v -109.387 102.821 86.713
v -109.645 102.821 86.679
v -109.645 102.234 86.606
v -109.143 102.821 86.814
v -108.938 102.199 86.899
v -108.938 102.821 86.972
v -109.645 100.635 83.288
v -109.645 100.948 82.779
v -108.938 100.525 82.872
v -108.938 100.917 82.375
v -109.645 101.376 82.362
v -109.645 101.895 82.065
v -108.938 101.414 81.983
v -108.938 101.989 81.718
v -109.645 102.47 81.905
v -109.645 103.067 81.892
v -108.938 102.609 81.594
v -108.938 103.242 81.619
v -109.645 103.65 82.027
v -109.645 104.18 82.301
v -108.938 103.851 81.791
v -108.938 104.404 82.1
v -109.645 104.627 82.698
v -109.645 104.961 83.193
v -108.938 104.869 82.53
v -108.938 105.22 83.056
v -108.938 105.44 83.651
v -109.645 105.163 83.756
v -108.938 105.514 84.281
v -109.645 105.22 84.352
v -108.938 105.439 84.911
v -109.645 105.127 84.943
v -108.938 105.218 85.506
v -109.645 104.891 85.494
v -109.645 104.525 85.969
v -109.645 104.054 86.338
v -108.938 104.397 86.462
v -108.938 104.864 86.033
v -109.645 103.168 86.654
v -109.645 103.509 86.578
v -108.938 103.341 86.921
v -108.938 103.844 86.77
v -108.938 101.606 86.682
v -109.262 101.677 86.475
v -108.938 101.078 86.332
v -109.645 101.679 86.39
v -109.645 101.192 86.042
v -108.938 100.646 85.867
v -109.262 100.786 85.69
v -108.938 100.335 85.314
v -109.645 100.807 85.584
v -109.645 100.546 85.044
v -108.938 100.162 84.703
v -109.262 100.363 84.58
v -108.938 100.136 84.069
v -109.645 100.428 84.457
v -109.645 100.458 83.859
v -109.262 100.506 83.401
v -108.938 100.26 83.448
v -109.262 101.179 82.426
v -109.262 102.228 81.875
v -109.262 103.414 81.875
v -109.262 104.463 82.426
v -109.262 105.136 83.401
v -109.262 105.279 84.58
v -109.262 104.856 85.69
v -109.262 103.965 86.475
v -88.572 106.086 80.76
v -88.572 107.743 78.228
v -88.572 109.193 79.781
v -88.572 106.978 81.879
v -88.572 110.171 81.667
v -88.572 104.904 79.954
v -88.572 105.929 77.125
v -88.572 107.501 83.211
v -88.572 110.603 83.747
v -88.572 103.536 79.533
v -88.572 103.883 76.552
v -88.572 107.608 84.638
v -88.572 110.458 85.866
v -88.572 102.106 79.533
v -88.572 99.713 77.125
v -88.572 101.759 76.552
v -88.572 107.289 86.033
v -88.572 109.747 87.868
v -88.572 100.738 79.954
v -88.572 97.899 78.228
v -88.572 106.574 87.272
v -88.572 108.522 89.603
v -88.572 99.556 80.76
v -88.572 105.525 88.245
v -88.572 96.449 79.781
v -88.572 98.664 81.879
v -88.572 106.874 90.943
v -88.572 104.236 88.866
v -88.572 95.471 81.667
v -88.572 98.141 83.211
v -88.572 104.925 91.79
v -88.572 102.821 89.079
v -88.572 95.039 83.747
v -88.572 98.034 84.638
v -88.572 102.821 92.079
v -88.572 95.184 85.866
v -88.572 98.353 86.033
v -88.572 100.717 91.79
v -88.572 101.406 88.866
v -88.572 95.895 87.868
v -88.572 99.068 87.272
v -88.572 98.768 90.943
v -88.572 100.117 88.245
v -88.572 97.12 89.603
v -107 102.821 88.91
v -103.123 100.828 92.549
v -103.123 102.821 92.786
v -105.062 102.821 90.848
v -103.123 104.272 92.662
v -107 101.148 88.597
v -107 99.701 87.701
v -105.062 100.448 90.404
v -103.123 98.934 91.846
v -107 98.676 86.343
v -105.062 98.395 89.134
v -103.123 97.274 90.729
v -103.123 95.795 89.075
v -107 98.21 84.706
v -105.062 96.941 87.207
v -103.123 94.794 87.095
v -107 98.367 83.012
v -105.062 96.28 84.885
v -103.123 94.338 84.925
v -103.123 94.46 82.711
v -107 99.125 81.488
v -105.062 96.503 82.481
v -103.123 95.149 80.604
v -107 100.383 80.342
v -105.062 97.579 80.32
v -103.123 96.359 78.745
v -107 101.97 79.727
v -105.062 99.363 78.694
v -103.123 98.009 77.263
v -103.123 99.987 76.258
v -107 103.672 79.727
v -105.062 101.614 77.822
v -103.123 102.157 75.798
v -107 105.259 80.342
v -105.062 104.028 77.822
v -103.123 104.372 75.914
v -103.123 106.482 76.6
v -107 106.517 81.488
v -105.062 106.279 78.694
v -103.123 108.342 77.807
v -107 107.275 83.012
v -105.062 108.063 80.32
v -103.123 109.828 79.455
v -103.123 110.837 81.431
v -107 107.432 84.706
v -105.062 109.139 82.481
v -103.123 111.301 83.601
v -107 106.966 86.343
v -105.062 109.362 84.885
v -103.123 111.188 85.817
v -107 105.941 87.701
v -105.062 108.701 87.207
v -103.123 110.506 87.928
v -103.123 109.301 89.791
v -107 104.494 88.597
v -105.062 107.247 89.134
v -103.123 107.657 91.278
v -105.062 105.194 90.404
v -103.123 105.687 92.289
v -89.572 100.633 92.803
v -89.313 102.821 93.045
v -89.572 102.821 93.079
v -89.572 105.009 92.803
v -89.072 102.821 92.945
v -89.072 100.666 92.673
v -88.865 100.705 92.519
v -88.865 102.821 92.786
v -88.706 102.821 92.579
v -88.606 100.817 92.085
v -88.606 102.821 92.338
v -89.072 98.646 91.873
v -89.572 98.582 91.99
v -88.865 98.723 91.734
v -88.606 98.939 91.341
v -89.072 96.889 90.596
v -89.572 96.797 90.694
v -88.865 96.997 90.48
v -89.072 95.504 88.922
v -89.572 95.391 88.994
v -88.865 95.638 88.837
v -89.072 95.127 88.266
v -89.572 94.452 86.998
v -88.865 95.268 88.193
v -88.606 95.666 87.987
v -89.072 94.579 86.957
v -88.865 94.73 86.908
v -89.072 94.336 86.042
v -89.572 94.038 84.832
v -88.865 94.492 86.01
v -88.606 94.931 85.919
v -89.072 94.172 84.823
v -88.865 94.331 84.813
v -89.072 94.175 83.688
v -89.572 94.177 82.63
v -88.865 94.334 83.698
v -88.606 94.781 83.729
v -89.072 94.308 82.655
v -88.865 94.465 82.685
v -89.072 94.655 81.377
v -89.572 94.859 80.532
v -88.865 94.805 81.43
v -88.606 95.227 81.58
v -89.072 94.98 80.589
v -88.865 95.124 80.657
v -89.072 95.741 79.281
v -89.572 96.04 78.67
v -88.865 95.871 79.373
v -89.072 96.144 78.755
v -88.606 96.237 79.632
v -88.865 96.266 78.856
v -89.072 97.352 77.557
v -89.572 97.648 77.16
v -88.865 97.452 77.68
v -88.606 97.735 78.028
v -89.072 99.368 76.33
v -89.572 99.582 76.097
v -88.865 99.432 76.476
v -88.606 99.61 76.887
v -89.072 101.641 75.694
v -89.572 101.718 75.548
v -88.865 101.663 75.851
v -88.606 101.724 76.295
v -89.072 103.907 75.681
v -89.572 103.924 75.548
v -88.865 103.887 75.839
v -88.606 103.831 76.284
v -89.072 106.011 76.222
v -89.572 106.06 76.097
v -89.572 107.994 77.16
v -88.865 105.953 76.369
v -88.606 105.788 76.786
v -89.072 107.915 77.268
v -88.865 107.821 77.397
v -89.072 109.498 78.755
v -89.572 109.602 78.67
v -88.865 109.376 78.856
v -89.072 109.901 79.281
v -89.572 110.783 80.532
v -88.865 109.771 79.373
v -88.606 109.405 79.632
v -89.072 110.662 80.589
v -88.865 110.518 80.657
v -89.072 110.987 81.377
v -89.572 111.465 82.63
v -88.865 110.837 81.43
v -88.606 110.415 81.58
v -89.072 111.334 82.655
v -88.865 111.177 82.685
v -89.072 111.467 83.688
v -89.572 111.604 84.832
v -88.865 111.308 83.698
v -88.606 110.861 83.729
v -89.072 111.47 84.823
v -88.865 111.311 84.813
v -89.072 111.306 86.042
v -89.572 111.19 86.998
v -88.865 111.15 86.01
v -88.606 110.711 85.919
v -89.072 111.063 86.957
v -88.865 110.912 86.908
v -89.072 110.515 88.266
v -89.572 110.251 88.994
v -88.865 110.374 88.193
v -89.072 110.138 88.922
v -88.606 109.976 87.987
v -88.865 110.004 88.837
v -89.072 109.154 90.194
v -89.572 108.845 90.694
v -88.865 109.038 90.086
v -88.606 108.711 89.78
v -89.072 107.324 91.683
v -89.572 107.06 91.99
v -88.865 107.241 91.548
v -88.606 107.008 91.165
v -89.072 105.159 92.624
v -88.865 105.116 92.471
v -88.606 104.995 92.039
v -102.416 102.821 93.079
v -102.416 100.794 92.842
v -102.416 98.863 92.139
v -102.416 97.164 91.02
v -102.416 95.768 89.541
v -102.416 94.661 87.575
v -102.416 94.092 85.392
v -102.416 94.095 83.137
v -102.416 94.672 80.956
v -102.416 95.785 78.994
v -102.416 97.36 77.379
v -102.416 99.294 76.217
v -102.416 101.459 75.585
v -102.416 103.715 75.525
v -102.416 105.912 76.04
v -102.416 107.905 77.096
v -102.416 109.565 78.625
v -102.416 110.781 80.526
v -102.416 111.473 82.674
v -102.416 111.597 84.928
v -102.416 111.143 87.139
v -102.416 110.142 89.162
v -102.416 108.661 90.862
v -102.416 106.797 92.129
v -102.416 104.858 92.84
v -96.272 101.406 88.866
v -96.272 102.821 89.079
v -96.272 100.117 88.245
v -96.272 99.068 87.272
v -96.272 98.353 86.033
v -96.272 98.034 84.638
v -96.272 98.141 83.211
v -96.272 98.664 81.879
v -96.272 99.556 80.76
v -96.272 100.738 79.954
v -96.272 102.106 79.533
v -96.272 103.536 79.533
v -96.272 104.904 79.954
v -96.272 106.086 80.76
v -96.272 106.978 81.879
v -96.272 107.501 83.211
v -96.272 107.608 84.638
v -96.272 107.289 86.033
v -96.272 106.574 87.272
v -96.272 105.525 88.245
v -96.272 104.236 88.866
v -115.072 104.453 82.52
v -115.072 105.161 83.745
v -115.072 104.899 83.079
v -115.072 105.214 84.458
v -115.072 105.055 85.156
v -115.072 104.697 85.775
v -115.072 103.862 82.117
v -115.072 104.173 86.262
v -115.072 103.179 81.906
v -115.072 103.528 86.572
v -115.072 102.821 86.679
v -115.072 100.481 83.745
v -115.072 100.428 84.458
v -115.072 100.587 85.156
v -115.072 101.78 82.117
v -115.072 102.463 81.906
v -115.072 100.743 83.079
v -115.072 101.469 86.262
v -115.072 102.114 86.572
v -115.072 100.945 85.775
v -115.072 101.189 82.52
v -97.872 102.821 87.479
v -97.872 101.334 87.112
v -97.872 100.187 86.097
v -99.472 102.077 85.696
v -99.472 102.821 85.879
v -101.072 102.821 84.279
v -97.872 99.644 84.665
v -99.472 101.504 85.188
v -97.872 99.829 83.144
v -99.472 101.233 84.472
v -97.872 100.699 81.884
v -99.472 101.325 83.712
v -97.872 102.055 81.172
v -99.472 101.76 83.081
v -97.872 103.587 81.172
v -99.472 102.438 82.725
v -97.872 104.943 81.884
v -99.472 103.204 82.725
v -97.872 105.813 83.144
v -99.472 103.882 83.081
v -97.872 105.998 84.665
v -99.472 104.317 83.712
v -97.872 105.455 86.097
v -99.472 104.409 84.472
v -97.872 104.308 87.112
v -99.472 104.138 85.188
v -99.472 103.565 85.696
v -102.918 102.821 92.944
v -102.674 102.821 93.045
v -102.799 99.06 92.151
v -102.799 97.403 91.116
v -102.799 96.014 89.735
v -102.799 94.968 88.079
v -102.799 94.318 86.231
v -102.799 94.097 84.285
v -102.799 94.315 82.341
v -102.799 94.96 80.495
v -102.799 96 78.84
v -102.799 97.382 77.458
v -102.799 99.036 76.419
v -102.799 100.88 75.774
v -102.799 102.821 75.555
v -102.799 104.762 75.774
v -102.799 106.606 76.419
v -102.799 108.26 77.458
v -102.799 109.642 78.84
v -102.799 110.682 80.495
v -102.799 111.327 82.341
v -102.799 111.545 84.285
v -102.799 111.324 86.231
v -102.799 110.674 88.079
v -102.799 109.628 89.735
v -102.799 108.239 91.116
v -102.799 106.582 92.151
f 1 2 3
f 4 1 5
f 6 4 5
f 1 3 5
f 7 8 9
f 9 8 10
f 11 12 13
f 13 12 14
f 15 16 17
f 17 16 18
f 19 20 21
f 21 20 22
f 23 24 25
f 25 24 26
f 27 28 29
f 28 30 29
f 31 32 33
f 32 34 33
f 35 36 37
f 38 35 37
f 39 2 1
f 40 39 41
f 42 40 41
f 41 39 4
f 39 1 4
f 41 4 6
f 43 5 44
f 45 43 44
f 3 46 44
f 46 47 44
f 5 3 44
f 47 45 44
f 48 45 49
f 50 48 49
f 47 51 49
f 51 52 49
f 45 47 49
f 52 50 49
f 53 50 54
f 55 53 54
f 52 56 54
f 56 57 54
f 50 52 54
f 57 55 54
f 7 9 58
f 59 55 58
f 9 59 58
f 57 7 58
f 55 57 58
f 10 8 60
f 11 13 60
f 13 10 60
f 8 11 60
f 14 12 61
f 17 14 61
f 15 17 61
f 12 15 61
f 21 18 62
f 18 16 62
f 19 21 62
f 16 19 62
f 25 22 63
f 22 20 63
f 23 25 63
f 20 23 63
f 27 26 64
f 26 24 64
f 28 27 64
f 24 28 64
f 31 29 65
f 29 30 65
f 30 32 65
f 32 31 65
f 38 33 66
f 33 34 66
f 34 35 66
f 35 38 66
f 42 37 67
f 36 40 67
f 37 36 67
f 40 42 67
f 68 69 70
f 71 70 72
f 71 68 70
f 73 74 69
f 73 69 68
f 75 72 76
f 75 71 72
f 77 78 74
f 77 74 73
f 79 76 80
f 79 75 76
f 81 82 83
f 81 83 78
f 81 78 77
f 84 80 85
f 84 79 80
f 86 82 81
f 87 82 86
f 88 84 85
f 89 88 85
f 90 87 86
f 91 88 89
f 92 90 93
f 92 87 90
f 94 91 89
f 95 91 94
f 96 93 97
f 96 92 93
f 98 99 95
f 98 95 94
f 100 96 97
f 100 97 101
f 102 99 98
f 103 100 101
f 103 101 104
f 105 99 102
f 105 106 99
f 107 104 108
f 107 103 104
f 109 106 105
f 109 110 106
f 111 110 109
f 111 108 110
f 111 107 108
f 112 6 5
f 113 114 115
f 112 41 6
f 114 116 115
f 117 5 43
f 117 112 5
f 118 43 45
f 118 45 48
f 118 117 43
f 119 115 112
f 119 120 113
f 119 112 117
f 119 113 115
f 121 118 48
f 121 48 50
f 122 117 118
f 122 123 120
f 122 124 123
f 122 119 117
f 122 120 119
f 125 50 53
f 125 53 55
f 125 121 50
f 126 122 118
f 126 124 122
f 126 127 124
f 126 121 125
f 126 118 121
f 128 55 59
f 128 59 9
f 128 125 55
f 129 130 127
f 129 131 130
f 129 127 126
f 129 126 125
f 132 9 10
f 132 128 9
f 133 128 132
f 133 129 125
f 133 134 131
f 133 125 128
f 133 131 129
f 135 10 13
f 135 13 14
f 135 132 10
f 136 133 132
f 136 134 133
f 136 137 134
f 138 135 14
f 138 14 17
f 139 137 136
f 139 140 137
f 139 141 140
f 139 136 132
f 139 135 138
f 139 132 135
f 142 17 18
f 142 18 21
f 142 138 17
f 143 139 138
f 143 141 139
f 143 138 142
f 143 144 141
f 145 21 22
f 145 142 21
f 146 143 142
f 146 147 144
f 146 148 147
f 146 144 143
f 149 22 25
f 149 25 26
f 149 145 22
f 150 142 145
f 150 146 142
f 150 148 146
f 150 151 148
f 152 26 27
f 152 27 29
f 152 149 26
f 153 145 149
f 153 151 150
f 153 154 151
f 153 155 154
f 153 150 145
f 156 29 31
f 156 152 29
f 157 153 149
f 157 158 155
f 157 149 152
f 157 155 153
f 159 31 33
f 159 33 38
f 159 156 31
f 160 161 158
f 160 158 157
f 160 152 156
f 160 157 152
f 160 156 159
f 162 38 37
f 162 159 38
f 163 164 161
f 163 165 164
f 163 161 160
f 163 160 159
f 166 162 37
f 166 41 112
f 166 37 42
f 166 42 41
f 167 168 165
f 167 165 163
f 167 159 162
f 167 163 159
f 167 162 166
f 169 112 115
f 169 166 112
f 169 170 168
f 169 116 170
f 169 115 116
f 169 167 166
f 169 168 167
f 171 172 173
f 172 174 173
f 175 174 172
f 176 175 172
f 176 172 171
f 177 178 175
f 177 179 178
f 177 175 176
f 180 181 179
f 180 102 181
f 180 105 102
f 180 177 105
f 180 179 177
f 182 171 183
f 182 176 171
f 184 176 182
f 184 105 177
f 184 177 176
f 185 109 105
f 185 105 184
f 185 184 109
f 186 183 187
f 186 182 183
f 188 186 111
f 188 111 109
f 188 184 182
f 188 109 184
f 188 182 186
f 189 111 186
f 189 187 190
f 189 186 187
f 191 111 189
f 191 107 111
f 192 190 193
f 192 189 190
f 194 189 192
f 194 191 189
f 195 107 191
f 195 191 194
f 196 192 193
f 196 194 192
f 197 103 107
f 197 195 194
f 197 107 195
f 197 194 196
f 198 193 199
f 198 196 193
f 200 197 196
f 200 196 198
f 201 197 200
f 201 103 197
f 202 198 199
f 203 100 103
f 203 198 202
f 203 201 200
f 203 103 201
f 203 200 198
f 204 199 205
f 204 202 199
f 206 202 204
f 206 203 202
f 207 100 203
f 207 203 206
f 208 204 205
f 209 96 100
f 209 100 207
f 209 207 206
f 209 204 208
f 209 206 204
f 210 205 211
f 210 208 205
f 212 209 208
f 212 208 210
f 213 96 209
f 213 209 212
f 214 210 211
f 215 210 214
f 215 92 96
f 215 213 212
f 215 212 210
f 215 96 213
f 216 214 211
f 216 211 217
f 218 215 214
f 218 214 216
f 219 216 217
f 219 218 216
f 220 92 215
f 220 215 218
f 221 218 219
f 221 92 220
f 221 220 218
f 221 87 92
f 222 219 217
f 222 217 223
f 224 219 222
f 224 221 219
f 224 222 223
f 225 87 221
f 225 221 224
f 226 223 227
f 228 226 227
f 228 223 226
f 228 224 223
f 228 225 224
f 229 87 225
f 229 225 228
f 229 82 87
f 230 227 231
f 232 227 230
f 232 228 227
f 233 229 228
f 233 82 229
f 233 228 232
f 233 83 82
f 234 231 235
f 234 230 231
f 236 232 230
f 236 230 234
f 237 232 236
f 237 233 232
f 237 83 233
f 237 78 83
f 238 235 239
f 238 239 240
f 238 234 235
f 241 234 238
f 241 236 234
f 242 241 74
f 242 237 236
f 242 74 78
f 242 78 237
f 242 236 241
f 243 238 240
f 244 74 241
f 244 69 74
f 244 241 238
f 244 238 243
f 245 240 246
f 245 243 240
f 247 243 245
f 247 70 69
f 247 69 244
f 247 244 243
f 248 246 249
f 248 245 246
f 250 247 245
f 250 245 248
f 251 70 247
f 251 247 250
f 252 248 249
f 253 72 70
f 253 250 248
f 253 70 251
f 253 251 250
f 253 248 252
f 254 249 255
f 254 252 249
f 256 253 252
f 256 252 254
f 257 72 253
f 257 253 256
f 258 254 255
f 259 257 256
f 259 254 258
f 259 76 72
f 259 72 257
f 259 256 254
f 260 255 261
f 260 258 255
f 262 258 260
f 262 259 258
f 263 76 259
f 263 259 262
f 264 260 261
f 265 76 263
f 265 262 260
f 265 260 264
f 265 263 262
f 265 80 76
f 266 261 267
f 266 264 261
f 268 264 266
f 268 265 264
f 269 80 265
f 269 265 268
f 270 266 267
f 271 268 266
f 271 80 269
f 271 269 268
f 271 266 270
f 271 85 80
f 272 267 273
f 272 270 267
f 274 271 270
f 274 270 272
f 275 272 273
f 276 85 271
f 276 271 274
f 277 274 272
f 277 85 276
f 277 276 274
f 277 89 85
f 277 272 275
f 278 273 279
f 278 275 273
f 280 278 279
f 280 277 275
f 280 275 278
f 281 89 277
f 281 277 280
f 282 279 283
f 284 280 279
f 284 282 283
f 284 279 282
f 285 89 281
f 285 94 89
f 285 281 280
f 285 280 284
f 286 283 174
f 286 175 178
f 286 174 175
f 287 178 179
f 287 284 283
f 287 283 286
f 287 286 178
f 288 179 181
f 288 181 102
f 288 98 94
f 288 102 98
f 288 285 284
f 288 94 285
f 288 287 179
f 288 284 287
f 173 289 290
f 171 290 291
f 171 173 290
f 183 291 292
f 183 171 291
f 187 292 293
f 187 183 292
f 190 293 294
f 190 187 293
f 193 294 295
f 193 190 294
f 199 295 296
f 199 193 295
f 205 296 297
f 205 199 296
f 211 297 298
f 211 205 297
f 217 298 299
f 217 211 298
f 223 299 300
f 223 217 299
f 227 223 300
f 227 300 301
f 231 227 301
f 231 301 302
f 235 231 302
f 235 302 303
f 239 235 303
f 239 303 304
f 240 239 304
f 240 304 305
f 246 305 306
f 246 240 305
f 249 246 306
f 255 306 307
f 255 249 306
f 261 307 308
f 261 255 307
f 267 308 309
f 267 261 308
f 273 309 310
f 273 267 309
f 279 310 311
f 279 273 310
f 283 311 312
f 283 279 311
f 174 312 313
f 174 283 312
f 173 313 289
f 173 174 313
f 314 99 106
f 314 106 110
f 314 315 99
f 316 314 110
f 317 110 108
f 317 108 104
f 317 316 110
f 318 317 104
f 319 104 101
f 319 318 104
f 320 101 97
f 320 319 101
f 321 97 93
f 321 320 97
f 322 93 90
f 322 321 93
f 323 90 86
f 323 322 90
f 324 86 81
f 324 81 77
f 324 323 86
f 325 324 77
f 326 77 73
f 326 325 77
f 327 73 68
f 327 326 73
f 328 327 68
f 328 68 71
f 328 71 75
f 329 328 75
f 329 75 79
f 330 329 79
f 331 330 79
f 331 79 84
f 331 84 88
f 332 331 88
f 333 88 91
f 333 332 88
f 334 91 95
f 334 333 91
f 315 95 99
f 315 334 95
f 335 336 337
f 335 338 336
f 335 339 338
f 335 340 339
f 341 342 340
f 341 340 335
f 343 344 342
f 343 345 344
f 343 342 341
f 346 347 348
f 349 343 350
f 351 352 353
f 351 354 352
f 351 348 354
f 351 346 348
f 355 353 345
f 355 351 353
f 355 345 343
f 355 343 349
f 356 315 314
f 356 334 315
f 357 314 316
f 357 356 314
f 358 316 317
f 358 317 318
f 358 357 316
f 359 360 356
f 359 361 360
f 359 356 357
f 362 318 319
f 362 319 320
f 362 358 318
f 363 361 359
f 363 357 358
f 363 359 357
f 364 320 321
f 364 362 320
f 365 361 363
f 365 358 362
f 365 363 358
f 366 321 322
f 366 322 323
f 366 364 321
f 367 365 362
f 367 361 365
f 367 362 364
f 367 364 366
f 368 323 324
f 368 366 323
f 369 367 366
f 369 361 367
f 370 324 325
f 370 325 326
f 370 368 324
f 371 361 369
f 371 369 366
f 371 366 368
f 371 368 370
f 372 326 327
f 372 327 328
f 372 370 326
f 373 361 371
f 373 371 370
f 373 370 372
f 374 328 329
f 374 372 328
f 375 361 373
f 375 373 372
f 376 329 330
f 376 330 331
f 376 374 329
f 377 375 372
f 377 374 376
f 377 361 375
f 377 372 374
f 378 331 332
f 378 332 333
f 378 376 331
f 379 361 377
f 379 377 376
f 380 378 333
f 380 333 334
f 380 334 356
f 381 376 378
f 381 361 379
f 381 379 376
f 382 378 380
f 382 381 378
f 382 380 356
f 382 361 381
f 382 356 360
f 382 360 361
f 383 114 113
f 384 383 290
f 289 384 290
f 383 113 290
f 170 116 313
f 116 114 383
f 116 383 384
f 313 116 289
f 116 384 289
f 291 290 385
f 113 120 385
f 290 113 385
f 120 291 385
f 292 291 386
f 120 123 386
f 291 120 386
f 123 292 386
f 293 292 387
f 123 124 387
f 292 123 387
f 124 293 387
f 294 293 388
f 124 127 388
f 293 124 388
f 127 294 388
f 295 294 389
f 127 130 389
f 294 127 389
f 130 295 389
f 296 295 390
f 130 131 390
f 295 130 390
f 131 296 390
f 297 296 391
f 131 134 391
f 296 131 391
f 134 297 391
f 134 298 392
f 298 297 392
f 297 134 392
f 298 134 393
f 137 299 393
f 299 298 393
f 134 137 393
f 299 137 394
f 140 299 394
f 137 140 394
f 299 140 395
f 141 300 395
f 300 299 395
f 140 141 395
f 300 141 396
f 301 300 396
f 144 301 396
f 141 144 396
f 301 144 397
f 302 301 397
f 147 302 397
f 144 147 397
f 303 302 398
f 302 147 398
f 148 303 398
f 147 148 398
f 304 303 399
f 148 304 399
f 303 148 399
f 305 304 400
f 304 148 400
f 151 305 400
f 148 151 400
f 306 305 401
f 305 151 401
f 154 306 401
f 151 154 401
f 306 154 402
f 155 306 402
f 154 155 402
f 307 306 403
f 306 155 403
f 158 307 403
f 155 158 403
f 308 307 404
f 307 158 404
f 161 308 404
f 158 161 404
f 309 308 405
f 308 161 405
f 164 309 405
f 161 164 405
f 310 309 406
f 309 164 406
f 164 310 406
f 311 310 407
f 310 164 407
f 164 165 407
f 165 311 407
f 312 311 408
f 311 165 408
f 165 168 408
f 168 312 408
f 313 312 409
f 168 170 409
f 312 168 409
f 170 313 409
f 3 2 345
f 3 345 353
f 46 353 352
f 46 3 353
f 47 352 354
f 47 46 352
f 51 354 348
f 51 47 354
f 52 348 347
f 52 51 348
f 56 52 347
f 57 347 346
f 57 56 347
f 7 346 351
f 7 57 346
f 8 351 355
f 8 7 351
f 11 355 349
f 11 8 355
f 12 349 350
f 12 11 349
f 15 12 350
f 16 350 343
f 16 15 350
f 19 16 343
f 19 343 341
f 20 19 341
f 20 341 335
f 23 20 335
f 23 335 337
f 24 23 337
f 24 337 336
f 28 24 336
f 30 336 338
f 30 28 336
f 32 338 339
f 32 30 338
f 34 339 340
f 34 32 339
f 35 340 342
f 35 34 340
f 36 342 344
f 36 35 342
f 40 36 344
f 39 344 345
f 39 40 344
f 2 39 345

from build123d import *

# Parameters (mm, degrees)
FILLET1_R = 1


with BuildPart() as part:
    # Sketch1 → Revolve3 (revolve)
    with BuildSketch(Plane.XY.offset(84.279), mode=Mode.PRIVATE) as revolve3_sk:
        Polygon((-115.072, 105.221), (-109.230578644, 105.221), (-102.830578644, 111.621), (-88.572, 111.621), (-88.572, 107.621), (-96.272, 107.621), (-101.072, 102.821), (-115.072, 102.821), align=None)
    revolve(revolve3_sk.sketch.rotate(Axis((-96.072, 102.821, 84.279), (1, 0, 0)), 90), axis=Axis((-96.072, 102.821, 84.279), (1, 0, 0)))

    # Fillet1
    fillet1_edges = [part.edges().sort_by_distance(p)[0] for p in [
        (-109.230578644, 102.821, 81.879),
        (-102.830578644, 102.821, 75.479),
        (-88.572, 102.821, 75.479),
    ]]
    fillet(fillet1_edges, radius=FILLET1_R)


solid = part.part
